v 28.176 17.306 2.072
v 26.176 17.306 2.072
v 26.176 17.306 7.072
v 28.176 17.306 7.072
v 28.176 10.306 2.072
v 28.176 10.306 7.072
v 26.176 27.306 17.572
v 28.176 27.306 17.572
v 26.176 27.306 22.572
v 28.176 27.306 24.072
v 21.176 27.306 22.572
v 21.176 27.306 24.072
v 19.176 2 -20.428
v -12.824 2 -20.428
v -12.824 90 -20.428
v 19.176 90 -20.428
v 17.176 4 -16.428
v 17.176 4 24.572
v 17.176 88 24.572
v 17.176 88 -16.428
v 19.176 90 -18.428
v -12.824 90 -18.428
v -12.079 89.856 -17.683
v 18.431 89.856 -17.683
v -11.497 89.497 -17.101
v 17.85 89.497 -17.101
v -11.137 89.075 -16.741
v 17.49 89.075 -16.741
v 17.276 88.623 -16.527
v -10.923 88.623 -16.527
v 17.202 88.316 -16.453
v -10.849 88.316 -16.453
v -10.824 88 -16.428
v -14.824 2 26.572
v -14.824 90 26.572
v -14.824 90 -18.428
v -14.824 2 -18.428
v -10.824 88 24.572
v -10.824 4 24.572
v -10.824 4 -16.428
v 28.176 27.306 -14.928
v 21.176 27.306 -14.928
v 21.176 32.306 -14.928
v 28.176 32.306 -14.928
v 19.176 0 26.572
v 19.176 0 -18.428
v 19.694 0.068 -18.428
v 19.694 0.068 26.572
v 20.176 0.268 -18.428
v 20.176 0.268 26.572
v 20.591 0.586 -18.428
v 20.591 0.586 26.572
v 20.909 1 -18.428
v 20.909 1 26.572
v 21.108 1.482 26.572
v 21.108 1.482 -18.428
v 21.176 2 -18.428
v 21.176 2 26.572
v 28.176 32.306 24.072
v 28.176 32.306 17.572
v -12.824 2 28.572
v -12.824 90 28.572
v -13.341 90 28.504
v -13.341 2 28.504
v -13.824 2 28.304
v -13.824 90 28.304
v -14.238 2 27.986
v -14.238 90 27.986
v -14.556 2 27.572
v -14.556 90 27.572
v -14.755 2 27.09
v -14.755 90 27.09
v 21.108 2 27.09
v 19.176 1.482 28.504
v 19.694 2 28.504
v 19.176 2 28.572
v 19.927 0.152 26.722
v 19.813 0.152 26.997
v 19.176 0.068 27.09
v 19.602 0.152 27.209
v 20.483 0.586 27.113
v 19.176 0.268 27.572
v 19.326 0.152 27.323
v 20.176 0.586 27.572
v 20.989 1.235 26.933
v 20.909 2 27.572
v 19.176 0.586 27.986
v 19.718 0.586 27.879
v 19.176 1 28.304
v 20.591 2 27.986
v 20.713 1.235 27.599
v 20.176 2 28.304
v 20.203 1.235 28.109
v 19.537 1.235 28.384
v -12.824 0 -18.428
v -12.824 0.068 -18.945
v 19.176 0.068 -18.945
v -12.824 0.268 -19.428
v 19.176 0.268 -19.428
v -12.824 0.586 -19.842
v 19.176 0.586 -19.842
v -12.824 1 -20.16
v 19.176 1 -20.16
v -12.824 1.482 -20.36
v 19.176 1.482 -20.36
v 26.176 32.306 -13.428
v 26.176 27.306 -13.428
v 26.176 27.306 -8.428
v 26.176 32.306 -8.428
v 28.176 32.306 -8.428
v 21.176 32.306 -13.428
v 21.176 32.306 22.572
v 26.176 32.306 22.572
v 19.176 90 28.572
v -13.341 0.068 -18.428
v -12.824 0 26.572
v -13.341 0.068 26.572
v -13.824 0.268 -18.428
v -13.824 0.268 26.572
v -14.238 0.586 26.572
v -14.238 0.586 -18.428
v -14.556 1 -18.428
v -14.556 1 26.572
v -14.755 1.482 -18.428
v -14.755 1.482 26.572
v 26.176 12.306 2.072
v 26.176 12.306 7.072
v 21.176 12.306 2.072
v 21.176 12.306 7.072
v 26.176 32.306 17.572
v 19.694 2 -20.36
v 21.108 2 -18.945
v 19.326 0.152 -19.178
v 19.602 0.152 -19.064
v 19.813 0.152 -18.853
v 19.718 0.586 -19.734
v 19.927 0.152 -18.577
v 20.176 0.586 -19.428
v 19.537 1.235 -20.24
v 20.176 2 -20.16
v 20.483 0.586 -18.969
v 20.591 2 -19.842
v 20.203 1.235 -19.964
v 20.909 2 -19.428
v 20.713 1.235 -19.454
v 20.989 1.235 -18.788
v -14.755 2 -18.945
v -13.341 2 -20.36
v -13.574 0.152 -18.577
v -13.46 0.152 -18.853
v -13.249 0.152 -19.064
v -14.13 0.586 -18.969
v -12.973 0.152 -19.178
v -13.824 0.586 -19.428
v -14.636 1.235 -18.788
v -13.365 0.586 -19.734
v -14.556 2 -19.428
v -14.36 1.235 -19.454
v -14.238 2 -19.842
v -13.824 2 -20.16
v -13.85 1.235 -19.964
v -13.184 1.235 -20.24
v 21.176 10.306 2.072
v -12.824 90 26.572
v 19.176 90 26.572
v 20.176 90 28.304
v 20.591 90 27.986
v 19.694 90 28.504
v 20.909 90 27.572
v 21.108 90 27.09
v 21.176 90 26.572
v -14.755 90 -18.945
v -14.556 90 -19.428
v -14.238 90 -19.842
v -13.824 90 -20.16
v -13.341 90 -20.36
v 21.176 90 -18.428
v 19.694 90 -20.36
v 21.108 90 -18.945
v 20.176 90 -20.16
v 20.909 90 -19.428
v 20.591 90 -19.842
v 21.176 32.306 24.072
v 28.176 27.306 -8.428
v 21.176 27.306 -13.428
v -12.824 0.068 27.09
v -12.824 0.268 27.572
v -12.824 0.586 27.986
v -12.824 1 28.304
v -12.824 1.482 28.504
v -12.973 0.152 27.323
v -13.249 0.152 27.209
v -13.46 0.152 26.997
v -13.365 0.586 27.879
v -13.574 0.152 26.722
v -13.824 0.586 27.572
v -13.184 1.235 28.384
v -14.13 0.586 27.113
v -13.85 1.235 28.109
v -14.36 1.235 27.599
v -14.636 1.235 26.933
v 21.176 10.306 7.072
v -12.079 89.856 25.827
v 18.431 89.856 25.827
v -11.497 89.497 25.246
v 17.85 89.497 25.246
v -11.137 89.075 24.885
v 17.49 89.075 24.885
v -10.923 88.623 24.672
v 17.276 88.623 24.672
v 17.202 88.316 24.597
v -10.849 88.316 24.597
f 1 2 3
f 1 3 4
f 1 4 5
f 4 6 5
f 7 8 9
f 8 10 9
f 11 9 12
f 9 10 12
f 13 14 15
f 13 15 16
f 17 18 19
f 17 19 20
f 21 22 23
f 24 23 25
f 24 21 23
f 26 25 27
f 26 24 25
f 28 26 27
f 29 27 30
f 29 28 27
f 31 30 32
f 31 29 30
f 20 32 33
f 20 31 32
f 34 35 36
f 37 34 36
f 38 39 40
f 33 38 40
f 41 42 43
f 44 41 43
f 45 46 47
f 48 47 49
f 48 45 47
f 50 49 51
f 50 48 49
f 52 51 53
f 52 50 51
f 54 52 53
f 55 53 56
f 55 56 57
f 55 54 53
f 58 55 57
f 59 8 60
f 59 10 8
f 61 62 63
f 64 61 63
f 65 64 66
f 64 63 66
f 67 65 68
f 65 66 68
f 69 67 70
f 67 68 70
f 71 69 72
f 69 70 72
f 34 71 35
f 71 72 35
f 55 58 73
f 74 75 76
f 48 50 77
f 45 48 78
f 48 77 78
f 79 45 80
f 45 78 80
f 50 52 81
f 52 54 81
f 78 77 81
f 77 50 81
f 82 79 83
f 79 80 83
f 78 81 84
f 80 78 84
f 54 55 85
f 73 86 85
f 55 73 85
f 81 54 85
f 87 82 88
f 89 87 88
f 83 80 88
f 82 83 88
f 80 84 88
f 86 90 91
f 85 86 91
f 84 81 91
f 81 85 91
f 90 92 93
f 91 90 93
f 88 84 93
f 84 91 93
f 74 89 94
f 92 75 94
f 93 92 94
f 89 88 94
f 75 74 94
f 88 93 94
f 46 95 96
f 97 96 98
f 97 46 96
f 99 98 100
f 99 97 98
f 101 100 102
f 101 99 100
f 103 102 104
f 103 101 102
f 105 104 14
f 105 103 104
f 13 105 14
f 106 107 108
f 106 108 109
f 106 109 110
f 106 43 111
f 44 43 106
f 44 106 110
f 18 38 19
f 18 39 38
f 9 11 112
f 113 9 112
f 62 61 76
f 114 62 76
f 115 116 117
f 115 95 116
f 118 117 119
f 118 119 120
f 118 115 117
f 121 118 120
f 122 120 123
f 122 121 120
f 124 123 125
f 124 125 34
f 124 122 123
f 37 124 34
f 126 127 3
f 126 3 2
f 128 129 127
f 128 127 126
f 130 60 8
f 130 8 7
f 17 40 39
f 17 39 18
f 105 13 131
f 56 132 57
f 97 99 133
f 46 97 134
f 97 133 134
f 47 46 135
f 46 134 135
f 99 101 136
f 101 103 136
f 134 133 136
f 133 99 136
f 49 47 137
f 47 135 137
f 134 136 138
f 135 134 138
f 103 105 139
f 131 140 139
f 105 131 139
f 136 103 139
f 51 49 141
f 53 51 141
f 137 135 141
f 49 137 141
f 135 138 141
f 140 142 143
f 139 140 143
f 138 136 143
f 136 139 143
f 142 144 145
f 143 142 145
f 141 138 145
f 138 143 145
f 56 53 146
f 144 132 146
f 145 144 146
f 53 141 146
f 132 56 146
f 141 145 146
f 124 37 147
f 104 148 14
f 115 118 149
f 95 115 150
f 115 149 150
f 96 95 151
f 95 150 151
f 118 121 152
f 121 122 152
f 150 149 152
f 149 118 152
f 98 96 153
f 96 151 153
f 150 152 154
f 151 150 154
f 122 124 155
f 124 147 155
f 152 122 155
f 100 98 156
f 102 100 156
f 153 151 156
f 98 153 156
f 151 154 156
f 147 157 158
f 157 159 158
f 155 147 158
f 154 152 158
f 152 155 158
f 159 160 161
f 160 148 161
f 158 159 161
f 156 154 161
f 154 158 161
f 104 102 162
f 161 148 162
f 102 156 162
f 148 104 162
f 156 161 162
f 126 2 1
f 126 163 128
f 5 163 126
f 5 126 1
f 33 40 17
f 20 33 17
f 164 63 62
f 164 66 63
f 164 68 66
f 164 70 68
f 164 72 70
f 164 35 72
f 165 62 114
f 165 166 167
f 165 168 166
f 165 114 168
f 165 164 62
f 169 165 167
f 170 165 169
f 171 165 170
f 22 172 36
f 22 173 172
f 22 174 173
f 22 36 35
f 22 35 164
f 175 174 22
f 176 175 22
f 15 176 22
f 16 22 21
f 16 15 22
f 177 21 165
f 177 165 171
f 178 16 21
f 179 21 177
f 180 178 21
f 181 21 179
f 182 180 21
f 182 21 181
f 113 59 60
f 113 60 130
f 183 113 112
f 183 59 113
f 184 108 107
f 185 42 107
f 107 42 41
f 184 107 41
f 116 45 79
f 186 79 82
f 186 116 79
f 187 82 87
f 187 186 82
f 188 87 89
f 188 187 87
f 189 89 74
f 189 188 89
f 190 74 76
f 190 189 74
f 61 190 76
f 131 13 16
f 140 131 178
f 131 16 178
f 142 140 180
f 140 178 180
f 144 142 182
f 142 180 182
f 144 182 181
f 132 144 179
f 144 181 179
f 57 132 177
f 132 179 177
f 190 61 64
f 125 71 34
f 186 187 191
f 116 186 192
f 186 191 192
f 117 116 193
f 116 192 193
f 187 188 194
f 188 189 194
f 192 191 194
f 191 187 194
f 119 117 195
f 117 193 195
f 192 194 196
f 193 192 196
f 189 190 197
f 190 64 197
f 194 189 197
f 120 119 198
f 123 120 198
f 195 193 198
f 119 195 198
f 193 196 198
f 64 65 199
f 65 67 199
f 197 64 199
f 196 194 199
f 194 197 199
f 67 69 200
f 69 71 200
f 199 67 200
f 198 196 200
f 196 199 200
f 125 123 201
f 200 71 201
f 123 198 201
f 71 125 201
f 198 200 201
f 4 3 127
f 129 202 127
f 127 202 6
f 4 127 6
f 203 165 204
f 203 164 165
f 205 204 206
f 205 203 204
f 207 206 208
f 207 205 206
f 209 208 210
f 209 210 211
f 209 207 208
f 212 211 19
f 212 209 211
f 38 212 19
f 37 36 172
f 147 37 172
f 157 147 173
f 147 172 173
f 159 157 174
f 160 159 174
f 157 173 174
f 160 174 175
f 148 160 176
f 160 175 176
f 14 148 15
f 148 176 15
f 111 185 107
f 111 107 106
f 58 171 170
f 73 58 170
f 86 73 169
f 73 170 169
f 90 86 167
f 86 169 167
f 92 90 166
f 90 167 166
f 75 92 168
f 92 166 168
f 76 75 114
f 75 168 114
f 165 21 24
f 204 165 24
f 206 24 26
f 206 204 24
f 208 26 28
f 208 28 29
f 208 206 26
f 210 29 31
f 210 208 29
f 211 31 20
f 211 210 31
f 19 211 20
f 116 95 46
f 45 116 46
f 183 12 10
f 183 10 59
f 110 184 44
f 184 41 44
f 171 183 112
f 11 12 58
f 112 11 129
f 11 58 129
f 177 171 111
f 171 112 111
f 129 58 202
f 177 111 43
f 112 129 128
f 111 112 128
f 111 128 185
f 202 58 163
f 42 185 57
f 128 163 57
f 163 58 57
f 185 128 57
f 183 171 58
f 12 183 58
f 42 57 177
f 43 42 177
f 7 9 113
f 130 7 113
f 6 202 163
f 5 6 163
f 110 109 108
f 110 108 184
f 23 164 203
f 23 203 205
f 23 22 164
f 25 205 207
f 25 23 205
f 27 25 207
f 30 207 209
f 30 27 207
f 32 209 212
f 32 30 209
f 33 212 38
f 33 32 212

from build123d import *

# Parameters (mm, degrees)
SKETCH1_W           = 36
SKETCH1_H           = 49
BOSS_EXTRUDE2_DEPTH = 90
SHELL3_T            = -4
FILLET1_R           = 2
FILLET2_R           = 2
FILLET3_R           = 2
FILLET4_R           = 2
FILLET5_R           = 2
SKETCH7_W           = 1.5
SKETCH7_H           = 5
SKETCH7_W_2         = 1.499999997
SKETCH7_W_3         = 5
SKETCH7_H_2         = 2
BOSS_EXTRUDE3_DEPTH = 7
SKETCH8_W           = 2
SKETCH8_H           = 5
BOSS_EXTRUDE4_DEPTH = 5
SKETCH9_W           = 2
SKETCH9_H           = 5
BOSS_EXTRUDE5_DEPTH = 5
SKETCH10_W          = 2
SKETCH10_H          = 5
BOSS_EXTRUDE6_DEPTH = 5
FILLET7_R           = 2
FILLET8_R           = 2
FILLET9_R           = 2
FILLET10_R          = 2


with BuildPart() as part:
    # Sketch1 → Boss-Extrude2 (new body)
    with BuildSketch(Plane(origin=(0, 0, 0), x_dir=(1, 0, 0), z_dir=(0, 1, 0))):
        with Locations((3.176470588, -4.072192513)):
            Rectangle(SKETCH1_W, SKETCH1_H)
    extrude(amount=BOSS_EXTRUDE2_DEPTH)

    # Shell3
    shell3_openings = [part.faces().sort_by_distance(p)[0] for p in [
        (3.176470588, 90, 4.072192513),
    ]]
    offset(amount=SHELL3_T, openings=shell3_openings, kind=Kind.INTERSECTION)

    # Fillet1
    fillet1_edges = [part.edges().sort_by_distance(p)[0] for p in [
        (-14.823529412, 45, -20.427807487),
    ]]
    fillet(fillet1_edges, radius=FILLET1_R)

    # Fillet2
    fillet2_edges = [part.edges().sort_by_distance(p)[0] for p in [
        (21.176470588, 45, -20.427807487),
    ]]
    fillet(fillet2_edges, radius=FILLET2_R)

    # Fillet3
    fillet3_edges = [part.edges().sort_by_distance(p)[0] for p in [
        (21.176470588, 45, 28.572192513),
    ]]
    fillet(fillet3_edges, radius=FILLET3_R)

    # Fillet4
    fillet4_edges = [part.edges().sort_by_distance(p)[0] for p in [
        (-14.823529412, 45, 28.572192513),
    ]]
    fillet(fillet4_edges, radius=FILLET4_R)

    # Fillet5
    fillet5_edges = [part.edges().sort_by_distance(p)[0] for p in [
        (-14.823529412, 0, 4.072192513),
        (3.176470588, 0, -20.427807487),
        (21.176470588, 0, 4.072192513),
        (3.176470588, 0, 28.572192513),
    ]]
    fillet(fillet5_edges, radius=FILLET5_R)

    # Sketch7 → Boss-Extrude3 (add)
    with BuildSketch(Plane(origin=(21.176470588, 0, 0), x_dir=(0, 0, -1), z_dir=(1, 0, 0))):
        with Locations((-23.322192513, 29.805726248)):
            Rectangle(SKETCH7_W, SKETCH7_H)
        with Locations((14.177807489, 29.805726248)):
            Rectangle(SKETCH7_W_2, SKETCH7_H)
        with Locations((-4.572192513, 11.305726248)):
            Rectangle(SKETCH7_W_3, SKETCH7_H_2)
    extrude(amount=BOSS_EXTRUDE3_DEPTH)

    # Sketch8 → Boss-Extrude4 (add)
    with BuildSketch(Plane(origin=(0, 0, 22.572192513), x_dir=(-1, 0, 0), z_dir=(0, 0, -1))):
        with Locations((-27.176470588, 29.805726248)):
            Rectangle(SKETCH8_W, SKETCH8_H)
    extrude(amount=BOSS_EXTRUDE4_DEPTH)

    # Sketch9 → Boss-Extrude5 (add)
    with BuildSketch(Plane.XY.offset(-13.42780749)):
        with Locations((27.176470588, 29.805726248)):
            Rectangle(SKETCH9_W, SKETCH9_H)
    extrude(amount=BOSS_EXTRUDE5_DEPTH)

    # Sketch10 → Boss-Extrude6 (add)
    with BuildSketch(Plane(origin=(0, 12.305726248, 0), x_dir=(1, 0, 0), z_dir=(0, 1, 0))):
        with Locations((27.176470588, -4.572192513)):
            Rectangle(SKETCH10_W, SKETCH10_H)
    extrude(amount=BOSS_EXTRUDE6_DEPTH)

    # Fillet7
    fillet7_edges = [part.edges().sort_by_distance(p)[0] for p in [
        (17.176470588, 90, 4.072192513),
    ]]
    fillet(fillet7_edges, radius=FILLET7_R)

    # Fillet8
    fillet8_edges = [part.edges().sort_by_distance(p)[0] for p in [
        (3.176470588, 90, -16.427807487),
    ]]
    fillet(fillet8_edges, radius=FILLET8_R)

    # Fillet9
    fillet9_edges = [part.edges().sort_by_distance(p)[0] for p in [
        (-10.823529412, 90, 4.072192513),
    ]]
    fillet(fillet9_edges, radius=FILLET9_R)

    # Fillet10
    fillet10_edges = [part.edges().sort_by_distance(p)[0] for p in [
        (3.176470588, 90, 24.572192513),
    ]]
    fillet(fillet10_edges, radius=FILLET10_R)


solid = part.part
